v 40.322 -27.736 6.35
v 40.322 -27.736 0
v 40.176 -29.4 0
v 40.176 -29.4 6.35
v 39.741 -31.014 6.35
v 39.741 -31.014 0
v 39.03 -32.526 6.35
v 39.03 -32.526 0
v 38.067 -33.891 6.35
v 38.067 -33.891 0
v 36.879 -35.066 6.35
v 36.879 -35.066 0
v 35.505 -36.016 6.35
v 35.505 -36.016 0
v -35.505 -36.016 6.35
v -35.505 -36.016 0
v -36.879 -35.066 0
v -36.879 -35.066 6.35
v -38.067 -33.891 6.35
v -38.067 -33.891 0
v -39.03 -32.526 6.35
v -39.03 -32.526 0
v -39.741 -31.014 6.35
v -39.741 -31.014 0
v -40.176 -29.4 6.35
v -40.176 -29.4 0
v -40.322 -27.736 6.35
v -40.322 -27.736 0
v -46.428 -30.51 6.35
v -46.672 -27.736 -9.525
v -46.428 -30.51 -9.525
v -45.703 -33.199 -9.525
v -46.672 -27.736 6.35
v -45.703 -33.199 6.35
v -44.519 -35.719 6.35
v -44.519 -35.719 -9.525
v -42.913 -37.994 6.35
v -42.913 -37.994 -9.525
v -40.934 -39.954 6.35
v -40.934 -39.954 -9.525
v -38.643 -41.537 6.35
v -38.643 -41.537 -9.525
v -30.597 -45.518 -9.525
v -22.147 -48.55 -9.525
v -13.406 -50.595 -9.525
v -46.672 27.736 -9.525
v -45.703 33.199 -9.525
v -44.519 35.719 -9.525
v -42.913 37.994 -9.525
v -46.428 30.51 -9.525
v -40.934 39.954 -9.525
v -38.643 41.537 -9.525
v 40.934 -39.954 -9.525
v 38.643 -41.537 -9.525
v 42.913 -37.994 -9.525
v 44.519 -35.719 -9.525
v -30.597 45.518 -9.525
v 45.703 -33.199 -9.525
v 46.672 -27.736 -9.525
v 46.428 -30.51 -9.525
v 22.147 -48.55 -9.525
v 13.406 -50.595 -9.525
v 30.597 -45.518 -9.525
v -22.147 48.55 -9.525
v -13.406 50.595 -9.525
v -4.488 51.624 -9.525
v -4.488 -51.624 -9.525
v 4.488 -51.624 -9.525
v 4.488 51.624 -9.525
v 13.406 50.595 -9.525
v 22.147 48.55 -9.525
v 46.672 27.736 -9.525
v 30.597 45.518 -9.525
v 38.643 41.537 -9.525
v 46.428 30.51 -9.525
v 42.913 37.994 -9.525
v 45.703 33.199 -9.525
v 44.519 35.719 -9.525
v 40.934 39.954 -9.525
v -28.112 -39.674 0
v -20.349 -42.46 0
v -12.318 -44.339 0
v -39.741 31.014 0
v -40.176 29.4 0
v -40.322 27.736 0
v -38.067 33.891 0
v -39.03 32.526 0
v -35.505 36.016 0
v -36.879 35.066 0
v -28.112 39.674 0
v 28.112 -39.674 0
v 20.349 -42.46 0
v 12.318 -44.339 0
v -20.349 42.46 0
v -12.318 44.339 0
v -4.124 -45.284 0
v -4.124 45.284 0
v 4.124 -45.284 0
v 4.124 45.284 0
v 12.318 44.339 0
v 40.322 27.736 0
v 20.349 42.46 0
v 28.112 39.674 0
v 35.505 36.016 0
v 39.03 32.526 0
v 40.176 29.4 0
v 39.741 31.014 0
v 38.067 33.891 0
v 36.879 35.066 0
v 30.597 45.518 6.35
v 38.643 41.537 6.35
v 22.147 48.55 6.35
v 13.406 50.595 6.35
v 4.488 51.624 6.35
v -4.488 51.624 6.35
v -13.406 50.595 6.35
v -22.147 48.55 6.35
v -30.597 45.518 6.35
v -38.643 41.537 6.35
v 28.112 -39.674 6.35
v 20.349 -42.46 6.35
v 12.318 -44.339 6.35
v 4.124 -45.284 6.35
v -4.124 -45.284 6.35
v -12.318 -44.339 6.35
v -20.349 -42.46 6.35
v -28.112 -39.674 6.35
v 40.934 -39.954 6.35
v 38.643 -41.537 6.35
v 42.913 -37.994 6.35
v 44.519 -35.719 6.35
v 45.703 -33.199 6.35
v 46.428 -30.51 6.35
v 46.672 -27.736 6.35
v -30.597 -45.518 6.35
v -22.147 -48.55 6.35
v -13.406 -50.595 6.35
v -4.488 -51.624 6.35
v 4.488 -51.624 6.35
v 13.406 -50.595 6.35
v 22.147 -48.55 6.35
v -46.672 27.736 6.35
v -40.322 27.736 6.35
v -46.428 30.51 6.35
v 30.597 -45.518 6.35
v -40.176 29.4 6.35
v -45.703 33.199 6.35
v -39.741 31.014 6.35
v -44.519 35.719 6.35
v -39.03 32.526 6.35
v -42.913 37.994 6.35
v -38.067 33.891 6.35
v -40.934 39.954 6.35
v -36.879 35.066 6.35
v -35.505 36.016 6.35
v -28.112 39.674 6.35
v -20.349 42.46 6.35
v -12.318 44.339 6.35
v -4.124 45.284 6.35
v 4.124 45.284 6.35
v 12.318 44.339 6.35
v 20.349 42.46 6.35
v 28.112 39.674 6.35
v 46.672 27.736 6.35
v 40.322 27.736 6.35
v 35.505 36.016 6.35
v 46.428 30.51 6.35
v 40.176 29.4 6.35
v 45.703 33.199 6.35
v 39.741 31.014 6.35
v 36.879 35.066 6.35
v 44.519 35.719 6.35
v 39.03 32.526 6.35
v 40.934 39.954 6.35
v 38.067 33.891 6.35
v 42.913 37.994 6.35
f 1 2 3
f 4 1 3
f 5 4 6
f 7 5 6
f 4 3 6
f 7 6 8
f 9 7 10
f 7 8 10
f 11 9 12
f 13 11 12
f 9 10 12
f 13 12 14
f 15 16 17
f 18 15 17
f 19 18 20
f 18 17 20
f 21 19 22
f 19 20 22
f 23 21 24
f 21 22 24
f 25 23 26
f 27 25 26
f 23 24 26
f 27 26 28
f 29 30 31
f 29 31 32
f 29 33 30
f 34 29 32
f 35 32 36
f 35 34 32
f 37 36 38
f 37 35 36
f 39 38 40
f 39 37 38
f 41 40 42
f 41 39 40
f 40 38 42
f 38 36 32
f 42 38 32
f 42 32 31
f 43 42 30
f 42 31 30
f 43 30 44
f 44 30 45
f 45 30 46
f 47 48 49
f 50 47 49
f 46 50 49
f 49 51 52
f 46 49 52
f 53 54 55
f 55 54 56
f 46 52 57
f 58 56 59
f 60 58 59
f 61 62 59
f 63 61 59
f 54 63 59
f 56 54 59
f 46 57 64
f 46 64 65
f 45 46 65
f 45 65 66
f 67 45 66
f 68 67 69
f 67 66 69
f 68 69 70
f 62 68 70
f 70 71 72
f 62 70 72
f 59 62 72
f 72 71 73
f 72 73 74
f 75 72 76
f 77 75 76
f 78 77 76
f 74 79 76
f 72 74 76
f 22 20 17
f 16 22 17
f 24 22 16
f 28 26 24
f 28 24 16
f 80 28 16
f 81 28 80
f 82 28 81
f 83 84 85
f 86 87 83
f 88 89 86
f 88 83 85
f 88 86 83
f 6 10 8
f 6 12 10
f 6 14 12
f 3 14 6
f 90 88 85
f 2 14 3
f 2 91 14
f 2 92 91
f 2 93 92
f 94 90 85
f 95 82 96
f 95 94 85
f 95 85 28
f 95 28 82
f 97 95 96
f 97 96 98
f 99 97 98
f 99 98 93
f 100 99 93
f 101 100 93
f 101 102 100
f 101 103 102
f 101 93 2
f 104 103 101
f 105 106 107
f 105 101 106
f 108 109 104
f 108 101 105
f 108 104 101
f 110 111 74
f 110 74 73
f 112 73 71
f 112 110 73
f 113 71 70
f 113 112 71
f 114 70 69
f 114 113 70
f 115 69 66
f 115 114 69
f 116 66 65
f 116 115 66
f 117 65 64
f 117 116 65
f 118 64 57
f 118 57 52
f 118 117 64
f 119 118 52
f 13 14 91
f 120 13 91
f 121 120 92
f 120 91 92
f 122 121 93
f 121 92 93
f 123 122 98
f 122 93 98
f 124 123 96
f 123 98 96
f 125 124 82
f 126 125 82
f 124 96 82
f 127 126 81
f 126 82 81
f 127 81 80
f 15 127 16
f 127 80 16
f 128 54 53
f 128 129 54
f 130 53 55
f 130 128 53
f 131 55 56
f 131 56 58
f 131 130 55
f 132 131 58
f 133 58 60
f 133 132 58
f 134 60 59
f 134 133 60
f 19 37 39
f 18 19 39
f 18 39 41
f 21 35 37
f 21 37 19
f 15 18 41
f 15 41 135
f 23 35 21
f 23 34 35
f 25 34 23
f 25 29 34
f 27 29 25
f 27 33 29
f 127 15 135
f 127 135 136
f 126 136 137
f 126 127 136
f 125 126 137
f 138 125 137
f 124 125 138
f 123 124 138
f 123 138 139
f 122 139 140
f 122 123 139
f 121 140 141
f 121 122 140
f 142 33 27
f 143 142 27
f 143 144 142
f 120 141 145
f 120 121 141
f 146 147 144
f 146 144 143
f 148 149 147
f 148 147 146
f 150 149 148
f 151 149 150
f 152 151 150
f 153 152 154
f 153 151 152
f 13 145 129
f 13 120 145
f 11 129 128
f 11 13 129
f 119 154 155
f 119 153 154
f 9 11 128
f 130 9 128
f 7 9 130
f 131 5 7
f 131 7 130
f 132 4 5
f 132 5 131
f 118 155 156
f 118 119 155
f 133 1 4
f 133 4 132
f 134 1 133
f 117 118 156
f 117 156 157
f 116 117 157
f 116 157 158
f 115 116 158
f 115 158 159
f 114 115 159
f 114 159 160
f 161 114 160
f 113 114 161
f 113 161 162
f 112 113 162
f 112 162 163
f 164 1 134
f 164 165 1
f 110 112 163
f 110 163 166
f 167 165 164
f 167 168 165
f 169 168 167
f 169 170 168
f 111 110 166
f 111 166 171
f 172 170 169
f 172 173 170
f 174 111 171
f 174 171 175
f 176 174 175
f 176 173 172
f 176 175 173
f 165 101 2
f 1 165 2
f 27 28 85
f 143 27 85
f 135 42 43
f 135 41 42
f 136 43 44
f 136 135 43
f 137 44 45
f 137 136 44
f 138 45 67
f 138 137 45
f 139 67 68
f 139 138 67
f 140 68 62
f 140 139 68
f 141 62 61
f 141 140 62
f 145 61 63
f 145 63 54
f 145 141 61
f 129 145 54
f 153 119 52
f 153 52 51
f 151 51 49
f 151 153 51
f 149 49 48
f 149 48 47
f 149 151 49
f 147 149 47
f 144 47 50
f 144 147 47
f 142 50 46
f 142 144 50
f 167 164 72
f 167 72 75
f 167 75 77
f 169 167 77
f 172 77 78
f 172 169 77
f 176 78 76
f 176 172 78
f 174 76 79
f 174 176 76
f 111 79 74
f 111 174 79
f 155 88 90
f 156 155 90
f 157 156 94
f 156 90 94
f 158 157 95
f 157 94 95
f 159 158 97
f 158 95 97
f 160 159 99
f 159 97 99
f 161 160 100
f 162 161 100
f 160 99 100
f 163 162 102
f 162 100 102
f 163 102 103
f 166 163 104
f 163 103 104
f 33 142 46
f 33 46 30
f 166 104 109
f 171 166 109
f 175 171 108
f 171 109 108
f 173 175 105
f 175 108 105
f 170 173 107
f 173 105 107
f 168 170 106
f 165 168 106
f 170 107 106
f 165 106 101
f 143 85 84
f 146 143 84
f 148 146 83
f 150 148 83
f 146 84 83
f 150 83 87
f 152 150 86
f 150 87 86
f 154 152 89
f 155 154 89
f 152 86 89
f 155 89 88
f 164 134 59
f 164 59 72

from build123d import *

# Parameters (mm, degrees)
F1_DEPTH = 6.35
F3_DEPTH = 9.525


with BuildPart() as f1:
    # F0 (on Top) → F1 (new body)
    with BuildSketch(Plane.XY):
        with BuildLine():
            Line((46.6725, -27.735808), (46.6725, 27.735808))
            ThreePointArc((46.6725, 27.735808), (44.518987, 35.719317), (38.642716, 41.536831))
            ThreePointArc((38.642716, 41.536831), (0, 51.7525), (-38.642716, 41.536831))
            ThreePointArc((-38.642716, 41.536831), (-44.518987, 35.719317), (-46.6725, 27.735808))
            Line((-46.6725, 27.735808), (-46.6725, -27.735808))
            ThreePointArc((-46.6725, -27.735808), (-44.518987, -35.719317), (-38.642716, -41.536831))
            ThreePointArc((-38.642716, -41.536831), (0, -51.7525), (38.642716, -41.536831))
            ThreePointArc((38.642716, -41.536831), (44.518987, -35.719317), (46.6725, -27.735808))
        make_face()
        with BuildLine():
            ThreePointArc((-35.504629, -36.016422), (-39.030392, -32.525914), (-40.3225, -27.735808))
            Line((-40.3225, -27.735808), (-40.3225, 27.735808))
            ThreePointArc((-40.3225, 27.735808), (-39.030392, 32.525914), (-35.504629, 36.016422))
            ThreePointArc((-35.504629, 36.016422), (0, 45.4025), (35.504629, 36.016422))
            ThreePointArc((35.504629, 36.016422), (39.030392, 32.525914), (40.3225, 27.735808))
            Line((40.3225, 27.735808), (40.3225, -27.735808))
            ThreePointArc((40.3225, -27.735808), (39.030392, -32.525914), (35.504629, -36.016422))
            ThreePointArc((35.504629, -36.016422), (0, -45.4025), (-35.504629, -36.016422))
        make_face(mode=Mode.SUBTRACT)
    extrude(amount=F1_DEPTH)

    # F2 (on Top) → F3 (join)
    with BuildSketch(Plane.XY):
        with BuildLine():
            ThreePointArc((38.642716, -41.536831), (44.518987, -35.719317), (46.6725, -27.735808))
            Line((46.6725, -27.735808), (46.6725, 27.735808))
            ThreePointArc((46.6725, 27.735808), (44.518987, 35.719317), (38.642716, 41.536831))
            ThreePointArc((38.642716, 41.536831), (0, 51.7525), (-38.642716, 41.536831))
            ThreePointArc((-38.642716, 41.536831), (-44.518987, 35.719317), (-46.6725, 27.735808))
            Line((-46.6725, 27.735808), (-46.6725, -27.735808))
            ThreePointArc((-46.6725, -27.735808), (-44.518987, -35.719317), (-38.642716, -41.536831))
            ThreePointArc((-38.642716, -41.536831), (0, -51.7525), (38.642716, -41.536831))
        make_face()
    extrude(amount=-F3_DEPTH)


solid = f1.part
